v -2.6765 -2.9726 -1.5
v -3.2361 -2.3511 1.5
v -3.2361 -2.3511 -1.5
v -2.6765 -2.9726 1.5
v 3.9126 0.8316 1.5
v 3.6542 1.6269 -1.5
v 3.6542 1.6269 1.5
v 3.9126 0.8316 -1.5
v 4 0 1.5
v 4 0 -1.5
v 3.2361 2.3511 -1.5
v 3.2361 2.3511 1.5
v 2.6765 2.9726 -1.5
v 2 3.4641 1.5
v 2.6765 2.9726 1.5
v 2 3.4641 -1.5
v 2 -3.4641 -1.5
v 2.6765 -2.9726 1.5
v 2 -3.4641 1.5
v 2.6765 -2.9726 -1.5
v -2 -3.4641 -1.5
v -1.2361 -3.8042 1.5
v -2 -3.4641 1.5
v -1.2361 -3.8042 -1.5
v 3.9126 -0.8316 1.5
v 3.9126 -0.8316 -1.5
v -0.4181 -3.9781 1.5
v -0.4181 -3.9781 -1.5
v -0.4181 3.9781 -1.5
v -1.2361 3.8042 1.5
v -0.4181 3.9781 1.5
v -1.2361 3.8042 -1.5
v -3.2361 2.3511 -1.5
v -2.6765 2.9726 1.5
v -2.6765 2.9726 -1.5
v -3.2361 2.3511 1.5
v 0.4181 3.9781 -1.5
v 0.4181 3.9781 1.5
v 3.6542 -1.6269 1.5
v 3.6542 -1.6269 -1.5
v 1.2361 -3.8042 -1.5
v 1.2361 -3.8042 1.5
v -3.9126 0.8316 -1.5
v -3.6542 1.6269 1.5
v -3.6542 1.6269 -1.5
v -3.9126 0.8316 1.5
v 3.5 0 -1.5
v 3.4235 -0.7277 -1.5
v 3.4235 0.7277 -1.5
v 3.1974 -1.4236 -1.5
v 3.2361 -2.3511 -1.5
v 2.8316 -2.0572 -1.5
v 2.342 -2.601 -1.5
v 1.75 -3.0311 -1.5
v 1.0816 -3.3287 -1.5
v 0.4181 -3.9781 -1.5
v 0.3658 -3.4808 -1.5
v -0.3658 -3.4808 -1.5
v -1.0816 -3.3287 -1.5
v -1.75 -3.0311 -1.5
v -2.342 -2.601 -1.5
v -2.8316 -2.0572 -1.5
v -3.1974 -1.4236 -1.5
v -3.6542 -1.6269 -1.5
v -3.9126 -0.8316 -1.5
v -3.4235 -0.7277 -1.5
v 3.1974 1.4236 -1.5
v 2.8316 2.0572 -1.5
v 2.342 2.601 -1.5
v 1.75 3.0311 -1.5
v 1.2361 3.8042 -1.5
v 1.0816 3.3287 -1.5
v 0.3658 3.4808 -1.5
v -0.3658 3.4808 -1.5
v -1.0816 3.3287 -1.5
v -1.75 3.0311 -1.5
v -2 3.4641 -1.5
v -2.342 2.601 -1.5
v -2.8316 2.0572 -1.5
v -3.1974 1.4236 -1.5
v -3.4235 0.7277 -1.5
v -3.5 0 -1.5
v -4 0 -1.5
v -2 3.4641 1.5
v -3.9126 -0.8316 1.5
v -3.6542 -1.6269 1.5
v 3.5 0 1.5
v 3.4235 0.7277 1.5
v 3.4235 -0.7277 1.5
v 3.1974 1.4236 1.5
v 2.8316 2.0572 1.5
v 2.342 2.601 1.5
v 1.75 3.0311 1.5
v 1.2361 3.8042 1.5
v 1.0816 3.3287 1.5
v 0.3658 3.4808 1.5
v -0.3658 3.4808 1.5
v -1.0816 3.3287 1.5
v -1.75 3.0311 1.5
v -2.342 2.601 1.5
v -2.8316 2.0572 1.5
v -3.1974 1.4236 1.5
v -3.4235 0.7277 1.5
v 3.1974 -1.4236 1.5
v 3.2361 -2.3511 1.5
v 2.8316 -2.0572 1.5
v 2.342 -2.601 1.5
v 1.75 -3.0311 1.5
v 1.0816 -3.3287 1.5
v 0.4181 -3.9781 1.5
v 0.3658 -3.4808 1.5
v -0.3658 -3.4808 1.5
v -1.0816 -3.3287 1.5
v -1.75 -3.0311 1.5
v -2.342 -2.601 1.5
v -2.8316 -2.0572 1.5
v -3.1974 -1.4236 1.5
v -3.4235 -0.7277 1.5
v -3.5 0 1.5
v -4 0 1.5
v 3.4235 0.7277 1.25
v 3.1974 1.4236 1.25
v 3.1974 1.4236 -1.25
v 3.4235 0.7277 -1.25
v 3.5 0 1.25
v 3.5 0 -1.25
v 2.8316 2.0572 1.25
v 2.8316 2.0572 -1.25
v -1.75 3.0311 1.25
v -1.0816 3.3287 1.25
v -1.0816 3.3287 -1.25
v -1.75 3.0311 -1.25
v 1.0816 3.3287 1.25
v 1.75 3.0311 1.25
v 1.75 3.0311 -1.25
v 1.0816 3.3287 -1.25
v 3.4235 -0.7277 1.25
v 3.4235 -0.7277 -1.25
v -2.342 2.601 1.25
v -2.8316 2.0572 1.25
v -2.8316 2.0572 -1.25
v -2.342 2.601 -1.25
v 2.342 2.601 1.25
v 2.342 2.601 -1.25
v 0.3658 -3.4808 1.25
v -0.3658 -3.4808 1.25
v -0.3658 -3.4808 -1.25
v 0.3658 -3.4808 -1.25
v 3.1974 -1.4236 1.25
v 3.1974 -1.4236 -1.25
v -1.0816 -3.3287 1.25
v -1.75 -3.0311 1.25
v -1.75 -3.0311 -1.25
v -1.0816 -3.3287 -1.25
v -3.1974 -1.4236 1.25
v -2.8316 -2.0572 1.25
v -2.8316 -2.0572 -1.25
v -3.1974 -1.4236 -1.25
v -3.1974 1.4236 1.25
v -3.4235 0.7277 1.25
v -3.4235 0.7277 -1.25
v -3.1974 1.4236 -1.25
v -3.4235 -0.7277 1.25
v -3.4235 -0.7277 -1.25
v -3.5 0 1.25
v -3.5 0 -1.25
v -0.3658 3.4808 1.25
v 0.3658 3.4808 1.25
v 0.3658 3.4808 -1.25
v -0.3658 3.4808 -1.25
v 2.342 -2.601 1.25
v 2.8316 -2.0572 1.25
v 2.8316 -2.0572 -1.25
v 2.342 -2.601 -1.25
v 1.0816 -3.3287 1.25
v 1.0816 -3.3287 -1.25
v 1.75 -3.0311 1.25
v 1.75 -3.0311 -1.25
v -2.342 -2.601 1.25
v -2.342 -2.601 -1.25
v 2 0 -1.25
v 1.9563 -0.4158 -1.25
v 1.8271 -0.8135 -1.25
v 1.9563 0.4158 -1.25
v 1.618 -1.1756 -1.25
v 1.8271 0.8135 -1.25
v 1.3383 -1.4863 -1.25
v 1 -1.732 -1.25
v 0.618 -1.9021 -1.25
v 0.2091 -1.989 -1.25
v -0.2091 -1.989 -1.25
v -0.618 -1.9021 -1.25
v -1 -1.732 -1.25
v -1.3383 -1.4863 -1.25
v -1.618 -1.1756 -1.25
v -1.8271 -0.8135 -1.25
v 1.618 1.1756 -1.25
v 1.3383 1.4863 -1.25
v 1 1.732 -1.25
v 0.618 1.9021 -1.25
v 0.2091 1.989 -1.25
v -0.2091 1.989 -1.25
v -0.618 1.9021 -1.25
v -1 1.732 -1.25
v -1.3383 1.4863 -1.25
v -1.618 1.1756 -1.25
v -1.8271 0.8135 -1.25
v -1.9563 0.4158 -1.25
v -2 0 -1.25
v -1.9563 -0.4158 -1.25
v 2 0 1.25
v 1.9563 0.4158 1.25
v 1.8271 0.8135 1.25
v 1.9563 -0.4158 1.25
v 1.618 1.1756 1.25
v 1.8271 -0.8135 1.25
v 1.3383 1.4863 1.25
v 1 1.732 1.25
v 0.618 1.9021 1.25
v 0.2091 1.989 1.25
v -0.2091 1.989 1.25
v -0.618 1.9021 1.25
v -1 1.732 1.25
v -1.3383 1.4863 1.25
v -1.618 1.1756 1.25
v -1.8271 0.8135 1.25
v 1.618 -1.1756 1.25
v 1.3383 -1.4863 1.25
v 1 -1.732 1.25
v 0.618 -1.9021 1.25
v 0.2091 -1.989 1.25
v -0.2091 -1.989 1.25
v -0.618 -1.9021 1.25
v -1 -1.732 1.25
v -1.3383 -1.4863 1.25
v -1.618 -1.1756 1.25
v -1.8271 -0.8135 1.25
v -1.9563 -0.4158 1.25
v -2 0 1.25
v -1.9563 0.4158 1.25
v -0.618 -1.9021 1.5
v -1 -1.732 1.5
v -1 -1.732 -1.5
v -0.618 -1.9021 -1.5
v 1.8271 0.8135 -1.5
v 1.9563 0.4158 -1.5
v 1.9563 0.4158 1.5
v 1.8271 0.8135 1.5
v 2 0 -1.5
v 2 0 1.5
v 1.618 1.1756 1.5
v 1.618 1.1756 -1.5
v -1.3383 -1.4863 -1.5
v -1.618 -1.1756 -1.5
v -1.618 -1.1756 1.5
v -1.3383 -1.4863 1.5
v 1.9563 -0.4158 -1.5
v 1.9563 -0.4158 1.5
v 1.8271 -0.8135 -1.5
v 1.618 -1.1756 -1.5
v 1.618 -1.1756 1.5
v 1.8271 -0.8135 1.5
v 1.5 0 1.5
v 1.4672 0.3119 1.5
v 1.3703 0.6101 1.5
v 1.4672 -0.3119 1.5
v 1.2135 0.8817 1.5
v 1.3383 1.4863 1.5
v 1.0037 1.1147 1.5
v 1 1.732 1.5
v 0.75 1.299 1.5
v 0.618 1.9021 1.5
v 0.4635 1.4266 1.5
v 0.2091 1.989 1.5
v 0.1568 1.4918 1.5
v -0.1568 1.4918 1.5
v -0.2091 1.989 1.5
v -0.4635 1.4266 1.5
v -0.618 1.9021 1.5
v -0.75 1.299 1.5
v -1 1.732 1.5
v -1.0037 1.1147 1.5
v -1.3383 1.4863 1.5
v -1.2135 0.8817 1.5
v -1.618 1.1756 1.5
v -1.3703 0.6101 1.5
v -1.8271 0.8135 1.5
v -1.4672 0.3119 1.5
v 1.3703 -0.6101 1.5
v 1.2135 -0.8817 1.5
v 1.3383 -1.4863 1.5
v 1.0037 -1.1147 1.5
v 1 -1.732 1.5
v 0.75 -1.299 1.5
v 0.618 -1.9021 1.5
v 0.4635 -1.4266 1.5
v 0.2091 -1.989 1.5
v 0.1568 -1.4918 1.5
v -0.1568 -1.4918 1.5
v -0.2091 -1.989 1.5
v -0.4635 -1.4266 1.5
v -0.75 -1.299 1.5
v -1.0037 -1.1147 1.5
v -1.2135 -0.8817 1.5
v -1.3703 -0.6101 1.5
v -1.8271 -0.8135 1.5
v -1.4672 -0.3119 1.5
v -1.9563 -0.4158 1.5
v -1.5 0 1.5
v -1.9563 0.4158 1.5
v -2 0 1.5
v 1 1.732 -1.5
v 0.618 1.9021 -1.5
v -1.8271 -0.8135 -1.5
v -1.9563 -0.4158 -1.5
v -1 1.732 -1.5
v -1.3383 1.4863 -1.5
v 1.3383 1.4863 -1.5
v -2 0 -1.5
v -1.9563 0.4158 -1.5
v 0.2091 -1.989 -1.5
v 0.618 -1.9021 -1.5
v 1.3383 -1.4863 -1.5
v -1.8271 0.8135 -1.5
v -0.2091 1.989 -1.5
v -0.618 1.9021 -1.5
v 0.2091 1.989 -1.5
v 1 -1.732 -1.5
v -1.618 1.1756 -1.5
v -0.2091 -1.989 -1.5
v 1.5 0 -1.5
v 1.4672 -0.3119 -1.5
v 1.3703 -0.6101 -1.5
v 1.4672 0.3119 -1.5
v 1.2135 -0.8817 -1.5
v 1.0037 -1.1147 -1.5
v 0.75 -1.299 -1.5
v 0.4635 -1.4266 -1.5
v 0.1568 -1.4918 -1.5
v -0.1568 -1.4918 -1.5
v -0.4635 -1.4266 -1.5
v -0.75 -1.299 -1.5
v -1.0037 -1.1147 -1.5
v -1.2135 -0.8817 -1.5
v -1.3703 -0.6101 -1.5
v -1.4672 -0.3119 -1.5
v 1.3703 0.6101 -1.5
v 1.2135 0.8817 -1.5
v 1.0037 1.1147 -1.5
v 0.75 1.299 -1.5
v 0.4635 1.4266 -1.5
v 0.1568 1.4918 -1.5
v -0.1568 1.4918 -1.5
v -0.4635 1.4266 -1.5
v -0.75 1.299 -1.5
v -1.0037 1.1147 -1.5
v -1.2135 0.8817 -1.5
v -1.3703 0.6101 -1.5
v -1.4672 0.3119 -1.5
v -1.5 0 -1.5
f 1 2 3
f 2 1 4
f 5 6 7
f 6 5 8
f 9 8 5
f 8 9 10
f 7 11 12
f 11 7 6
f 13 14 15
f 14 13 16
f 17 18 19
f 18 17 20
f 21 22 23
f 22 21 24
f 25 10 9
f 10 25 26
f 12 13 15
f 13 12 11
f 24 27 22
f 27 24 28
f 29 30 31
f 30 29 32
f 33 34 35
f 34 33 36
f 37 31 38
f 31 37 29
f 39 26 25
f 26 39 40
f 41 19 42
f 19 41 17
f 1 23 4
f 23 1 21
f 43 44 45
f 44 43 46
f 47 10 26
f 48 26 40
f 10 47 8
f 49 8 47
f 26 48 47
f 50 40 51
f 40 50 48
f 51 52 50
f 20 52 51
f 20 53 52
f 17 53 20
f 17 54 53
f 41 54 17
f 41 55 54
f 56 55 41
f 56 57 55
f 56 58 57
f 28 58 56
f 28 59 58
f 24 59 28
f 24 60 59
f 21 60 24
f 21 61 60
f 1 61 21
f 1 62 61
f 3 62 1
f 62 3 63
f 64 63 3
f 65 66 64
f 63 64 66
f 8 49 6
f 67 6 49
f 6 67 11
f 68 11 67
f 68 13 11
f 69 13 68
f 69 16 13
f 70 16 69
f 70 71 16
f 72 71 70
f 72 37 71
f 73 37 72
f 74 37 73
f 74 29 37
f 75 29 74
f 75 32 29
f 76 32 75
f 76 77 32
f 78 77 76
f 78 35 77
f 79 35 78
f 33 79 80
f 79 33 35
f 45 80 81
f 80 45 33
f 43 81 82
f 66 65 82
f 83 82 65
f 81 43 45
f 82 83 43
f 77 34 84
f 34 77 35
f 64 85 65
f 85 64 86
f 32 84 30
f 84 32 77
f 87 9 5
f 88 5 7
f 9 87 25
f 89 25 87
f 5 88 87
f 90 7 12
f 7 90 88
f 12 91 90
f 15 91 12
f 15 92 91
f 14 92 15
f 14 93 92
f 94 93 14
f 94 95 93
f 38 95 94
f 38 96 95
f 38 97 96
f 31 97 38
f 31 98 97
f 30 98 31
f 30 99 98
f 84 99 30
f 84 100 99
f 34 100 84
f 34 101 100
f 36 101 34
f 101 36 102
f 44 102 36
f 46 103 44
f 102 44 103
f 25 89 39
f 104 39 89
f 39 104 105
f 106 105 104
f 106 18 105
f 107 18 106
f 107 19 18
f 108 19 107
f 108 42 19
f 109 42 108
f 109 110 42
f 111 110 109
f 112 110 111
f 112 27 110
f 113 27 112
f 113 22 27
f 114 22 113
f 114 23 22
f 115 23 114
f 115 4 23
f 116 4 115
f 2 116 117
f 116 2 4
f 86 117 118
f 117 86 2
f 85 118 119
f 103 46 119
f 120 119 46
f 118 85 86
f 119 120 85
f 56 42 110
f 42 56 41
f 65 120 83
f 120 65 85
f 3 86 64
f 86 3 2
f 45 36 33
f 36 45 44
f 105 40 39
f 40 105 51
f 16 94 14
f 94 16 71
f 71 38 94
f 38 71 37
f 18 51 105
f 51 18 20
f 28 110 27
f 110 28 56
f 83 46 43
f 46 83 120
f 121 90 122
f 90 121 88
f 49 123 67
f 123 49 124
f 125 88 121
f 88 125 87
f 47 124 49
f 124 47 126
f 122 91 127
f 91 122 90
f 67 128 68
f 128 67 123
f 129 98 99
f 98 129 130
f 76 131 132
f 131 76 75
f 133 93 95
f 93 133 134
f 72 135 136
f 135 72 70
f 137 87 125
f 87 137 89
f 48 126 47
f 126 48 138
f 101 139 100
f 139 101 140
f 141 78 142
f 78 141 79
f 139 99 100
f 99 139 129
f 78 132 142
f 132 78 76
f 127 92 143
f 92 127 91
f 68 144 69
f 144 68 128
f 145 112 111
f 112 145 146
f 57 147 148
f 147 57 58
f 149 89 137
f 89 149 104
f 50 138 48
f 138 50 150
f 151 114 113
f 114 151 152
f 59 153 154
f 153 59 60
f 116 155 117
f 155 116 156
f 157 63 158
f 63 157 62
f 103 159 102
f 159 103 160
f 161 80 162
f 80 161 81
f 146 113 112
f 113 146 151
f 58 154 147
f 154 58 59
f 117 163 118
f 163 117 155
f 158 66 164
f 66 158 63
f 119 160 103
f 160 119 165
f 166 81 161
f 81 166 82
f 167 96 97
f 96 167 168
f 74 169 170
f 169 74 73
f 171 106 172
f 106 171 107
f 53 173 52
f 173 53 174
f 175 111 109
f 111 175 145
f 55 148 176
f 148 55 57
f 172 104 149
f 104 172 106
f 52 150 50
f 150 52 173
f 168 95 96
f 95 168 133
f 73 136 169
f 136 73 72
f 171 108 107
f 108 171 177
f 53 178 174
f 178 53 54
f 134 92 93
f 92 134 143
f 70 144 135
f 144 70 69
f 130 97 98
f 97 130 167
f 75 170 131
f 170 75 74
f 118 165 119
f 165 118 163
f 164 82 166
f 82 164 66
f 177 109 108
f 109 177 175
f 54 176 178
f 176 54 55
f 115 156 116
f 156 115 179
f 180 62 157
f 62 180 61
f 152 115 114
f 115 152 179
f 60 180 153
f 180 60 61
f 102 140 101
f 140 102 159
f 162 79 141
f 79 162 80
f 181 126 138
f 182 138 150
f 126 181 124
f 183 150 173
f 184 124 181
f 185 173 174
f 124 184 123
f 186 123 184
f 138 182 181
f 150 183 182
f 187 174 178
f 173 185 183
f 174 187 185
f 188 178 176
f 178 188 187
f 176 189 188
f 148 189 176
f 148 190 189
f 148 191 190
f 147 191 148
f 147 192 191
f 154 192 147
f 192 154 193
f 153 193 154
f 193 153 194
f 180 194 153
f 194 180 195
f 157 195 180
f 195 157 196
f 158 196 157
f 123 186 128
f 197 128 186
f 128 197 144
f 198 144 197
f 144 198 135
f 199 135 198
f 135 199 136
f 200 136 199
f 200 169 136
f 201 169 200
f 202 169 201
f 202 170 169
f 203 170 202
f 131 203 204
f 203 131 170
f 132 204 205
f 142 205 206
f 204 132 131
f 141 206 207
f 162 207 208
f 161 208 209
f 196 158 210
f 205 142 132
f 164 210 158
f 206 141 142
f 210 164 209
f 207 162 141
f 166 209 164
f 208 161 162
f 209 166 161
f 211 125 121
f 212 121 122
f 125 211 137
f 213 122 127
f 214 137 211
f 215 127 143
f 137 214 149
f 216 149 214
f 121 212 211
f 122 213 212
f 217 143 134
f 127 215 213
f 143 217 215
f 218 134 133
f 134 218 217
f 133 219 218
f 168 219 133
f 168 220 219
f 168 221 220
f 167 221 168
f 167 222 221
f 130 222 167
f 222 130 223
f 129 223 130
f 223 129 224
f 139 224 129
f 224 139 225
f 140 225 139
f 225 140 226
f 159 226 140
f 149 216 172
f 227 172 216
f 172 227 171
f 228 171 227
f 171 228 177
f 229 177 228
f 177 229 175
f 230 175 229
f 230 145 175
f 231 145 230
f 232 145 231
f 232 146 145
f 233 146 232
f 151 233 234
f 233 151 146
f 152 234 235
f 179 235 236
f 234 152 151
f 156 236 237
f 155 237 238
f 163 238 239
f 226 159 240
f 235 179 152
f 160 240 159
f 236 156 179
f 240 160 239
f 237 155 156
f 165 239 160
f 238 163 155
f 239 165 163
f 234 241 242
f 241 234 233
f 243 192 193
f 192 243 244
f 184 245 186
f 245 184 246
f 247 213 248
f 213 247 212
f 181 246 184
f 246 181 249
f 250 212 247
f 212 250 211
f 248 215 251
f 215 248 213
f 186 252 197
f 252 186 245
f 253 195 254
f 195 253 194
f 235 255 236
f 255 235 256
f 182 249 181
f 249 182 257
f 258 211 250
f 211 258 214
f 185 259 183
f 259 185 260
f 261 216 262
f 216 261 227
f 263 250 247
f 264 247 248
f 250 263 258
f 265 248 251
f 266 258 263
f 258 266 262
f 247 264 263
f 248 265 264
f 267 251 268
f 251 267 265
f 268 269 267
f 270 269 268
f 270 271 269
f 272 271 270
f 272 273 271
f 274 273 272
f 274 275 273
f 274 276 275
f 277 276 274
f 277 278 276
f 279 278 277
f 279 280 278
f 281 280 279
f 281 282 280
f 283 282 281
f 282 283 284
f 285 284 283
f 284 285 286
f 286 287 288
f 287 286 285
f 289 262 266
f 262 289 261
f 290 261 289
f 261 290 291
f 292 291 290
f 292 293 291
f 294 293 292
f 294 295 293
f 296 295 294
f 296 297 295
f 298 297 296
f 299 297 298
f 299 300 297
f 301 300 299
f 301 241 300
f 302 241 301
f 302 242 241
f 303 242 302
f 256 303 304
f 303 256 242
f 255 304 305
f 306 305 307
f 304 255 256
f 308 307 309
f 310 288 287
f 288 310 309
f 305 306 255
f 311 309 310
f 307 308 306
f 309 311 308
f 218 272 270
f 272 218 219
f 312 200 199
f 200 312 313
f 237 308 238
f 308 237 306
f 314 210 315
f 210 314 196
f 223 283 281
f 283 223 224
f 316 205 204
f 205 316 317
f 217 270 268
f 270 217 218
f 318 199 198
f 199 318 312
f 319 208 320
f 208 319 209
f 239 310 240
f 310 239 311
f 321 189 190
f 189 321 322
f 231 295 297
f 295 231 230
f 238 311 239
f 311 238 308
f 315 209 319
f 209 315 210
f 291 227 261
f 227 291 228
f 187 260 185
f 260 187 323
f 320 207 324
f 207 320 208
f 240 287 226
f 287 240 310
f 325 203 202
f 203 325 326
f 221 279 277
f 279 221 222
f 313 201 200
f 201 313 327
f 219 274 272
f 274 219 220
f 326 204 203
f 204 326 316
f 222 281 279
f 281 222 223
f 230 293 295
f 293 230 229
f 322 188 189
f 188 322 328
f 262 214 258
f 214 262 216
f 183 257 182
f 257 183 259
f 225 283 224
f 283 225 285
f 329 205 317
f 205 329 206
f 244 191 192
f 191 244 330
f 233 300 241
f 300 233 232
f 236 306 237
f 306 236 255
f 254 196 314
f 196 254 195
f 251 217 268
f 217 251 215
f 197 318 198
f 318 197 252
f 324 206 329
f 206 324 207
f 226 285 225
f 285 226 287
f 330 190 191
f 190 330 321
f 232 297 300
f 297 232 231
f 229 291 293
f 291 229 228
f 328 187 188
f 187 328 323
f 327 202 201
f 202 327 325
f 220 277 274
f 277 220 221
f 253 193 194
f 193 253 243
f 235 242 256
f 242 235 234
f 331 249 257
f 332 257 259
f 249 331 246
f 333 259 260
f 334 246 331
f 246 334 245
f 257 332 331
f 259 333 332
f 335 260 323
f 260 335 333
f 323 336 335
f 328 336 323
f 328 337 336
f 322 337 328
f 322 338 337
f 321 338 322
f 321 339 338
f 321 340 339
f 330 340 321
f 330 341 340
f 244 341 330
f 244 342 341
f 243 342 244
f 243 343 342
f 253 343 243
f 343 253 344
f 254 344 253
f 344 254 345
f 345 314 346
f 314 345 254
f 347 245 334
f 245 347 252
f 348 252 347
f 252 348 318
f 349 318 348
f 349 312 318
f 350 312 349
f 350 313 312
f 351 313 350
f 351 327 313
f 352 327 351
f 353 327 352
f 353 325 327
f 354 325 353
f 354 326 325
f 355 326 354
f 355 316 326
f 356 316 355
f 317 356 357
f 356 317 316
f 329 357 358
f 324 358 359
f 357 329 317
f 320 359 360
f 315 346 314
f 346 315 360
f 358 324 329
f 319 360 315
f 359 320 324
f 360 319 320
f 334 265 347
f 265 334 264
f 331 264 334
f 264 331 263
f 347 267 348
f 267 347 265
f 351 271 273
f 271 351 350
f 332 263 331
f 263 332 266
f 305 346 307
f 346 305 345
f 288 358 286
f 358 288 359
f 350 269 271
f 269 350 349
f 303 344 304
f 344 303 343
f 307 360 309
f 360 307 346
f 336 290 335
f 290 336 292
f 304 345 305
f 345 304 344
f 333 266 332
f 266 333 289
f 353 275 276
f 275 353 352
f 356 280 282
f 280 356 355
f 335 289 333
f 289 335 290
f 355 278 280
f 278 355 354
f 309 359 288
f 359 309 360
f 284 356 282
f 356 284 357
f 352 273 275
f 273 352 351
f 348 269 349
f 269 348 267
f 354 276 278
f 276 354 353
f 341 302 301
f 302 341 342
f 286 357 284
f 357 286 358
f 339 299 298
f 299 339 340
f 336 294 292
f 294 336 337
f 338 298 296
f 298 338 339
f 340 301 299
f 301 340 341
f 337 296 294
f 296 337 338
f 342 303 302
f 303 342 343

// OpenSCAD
module ballbearing(id, od, width) {
    difference() {
        union() {
            difference() {
                color("lightgrey") cylinder(d=od, h=width+.5, center=true);
                color("lightgrey") cylinder(d=od-1, h=width+2, center=true);
            }
            color("black") cylinder(d=od-1, h=width, center=true);
            color("lightgrey") cylinder(d=id+1, h=width+.5, center=true);
        }
        
        color("lightgrey") cylinder(d=id, h=width*2, center=true);
    }
    
}

$fn=30;
ballbearing(3,8,2.5);
